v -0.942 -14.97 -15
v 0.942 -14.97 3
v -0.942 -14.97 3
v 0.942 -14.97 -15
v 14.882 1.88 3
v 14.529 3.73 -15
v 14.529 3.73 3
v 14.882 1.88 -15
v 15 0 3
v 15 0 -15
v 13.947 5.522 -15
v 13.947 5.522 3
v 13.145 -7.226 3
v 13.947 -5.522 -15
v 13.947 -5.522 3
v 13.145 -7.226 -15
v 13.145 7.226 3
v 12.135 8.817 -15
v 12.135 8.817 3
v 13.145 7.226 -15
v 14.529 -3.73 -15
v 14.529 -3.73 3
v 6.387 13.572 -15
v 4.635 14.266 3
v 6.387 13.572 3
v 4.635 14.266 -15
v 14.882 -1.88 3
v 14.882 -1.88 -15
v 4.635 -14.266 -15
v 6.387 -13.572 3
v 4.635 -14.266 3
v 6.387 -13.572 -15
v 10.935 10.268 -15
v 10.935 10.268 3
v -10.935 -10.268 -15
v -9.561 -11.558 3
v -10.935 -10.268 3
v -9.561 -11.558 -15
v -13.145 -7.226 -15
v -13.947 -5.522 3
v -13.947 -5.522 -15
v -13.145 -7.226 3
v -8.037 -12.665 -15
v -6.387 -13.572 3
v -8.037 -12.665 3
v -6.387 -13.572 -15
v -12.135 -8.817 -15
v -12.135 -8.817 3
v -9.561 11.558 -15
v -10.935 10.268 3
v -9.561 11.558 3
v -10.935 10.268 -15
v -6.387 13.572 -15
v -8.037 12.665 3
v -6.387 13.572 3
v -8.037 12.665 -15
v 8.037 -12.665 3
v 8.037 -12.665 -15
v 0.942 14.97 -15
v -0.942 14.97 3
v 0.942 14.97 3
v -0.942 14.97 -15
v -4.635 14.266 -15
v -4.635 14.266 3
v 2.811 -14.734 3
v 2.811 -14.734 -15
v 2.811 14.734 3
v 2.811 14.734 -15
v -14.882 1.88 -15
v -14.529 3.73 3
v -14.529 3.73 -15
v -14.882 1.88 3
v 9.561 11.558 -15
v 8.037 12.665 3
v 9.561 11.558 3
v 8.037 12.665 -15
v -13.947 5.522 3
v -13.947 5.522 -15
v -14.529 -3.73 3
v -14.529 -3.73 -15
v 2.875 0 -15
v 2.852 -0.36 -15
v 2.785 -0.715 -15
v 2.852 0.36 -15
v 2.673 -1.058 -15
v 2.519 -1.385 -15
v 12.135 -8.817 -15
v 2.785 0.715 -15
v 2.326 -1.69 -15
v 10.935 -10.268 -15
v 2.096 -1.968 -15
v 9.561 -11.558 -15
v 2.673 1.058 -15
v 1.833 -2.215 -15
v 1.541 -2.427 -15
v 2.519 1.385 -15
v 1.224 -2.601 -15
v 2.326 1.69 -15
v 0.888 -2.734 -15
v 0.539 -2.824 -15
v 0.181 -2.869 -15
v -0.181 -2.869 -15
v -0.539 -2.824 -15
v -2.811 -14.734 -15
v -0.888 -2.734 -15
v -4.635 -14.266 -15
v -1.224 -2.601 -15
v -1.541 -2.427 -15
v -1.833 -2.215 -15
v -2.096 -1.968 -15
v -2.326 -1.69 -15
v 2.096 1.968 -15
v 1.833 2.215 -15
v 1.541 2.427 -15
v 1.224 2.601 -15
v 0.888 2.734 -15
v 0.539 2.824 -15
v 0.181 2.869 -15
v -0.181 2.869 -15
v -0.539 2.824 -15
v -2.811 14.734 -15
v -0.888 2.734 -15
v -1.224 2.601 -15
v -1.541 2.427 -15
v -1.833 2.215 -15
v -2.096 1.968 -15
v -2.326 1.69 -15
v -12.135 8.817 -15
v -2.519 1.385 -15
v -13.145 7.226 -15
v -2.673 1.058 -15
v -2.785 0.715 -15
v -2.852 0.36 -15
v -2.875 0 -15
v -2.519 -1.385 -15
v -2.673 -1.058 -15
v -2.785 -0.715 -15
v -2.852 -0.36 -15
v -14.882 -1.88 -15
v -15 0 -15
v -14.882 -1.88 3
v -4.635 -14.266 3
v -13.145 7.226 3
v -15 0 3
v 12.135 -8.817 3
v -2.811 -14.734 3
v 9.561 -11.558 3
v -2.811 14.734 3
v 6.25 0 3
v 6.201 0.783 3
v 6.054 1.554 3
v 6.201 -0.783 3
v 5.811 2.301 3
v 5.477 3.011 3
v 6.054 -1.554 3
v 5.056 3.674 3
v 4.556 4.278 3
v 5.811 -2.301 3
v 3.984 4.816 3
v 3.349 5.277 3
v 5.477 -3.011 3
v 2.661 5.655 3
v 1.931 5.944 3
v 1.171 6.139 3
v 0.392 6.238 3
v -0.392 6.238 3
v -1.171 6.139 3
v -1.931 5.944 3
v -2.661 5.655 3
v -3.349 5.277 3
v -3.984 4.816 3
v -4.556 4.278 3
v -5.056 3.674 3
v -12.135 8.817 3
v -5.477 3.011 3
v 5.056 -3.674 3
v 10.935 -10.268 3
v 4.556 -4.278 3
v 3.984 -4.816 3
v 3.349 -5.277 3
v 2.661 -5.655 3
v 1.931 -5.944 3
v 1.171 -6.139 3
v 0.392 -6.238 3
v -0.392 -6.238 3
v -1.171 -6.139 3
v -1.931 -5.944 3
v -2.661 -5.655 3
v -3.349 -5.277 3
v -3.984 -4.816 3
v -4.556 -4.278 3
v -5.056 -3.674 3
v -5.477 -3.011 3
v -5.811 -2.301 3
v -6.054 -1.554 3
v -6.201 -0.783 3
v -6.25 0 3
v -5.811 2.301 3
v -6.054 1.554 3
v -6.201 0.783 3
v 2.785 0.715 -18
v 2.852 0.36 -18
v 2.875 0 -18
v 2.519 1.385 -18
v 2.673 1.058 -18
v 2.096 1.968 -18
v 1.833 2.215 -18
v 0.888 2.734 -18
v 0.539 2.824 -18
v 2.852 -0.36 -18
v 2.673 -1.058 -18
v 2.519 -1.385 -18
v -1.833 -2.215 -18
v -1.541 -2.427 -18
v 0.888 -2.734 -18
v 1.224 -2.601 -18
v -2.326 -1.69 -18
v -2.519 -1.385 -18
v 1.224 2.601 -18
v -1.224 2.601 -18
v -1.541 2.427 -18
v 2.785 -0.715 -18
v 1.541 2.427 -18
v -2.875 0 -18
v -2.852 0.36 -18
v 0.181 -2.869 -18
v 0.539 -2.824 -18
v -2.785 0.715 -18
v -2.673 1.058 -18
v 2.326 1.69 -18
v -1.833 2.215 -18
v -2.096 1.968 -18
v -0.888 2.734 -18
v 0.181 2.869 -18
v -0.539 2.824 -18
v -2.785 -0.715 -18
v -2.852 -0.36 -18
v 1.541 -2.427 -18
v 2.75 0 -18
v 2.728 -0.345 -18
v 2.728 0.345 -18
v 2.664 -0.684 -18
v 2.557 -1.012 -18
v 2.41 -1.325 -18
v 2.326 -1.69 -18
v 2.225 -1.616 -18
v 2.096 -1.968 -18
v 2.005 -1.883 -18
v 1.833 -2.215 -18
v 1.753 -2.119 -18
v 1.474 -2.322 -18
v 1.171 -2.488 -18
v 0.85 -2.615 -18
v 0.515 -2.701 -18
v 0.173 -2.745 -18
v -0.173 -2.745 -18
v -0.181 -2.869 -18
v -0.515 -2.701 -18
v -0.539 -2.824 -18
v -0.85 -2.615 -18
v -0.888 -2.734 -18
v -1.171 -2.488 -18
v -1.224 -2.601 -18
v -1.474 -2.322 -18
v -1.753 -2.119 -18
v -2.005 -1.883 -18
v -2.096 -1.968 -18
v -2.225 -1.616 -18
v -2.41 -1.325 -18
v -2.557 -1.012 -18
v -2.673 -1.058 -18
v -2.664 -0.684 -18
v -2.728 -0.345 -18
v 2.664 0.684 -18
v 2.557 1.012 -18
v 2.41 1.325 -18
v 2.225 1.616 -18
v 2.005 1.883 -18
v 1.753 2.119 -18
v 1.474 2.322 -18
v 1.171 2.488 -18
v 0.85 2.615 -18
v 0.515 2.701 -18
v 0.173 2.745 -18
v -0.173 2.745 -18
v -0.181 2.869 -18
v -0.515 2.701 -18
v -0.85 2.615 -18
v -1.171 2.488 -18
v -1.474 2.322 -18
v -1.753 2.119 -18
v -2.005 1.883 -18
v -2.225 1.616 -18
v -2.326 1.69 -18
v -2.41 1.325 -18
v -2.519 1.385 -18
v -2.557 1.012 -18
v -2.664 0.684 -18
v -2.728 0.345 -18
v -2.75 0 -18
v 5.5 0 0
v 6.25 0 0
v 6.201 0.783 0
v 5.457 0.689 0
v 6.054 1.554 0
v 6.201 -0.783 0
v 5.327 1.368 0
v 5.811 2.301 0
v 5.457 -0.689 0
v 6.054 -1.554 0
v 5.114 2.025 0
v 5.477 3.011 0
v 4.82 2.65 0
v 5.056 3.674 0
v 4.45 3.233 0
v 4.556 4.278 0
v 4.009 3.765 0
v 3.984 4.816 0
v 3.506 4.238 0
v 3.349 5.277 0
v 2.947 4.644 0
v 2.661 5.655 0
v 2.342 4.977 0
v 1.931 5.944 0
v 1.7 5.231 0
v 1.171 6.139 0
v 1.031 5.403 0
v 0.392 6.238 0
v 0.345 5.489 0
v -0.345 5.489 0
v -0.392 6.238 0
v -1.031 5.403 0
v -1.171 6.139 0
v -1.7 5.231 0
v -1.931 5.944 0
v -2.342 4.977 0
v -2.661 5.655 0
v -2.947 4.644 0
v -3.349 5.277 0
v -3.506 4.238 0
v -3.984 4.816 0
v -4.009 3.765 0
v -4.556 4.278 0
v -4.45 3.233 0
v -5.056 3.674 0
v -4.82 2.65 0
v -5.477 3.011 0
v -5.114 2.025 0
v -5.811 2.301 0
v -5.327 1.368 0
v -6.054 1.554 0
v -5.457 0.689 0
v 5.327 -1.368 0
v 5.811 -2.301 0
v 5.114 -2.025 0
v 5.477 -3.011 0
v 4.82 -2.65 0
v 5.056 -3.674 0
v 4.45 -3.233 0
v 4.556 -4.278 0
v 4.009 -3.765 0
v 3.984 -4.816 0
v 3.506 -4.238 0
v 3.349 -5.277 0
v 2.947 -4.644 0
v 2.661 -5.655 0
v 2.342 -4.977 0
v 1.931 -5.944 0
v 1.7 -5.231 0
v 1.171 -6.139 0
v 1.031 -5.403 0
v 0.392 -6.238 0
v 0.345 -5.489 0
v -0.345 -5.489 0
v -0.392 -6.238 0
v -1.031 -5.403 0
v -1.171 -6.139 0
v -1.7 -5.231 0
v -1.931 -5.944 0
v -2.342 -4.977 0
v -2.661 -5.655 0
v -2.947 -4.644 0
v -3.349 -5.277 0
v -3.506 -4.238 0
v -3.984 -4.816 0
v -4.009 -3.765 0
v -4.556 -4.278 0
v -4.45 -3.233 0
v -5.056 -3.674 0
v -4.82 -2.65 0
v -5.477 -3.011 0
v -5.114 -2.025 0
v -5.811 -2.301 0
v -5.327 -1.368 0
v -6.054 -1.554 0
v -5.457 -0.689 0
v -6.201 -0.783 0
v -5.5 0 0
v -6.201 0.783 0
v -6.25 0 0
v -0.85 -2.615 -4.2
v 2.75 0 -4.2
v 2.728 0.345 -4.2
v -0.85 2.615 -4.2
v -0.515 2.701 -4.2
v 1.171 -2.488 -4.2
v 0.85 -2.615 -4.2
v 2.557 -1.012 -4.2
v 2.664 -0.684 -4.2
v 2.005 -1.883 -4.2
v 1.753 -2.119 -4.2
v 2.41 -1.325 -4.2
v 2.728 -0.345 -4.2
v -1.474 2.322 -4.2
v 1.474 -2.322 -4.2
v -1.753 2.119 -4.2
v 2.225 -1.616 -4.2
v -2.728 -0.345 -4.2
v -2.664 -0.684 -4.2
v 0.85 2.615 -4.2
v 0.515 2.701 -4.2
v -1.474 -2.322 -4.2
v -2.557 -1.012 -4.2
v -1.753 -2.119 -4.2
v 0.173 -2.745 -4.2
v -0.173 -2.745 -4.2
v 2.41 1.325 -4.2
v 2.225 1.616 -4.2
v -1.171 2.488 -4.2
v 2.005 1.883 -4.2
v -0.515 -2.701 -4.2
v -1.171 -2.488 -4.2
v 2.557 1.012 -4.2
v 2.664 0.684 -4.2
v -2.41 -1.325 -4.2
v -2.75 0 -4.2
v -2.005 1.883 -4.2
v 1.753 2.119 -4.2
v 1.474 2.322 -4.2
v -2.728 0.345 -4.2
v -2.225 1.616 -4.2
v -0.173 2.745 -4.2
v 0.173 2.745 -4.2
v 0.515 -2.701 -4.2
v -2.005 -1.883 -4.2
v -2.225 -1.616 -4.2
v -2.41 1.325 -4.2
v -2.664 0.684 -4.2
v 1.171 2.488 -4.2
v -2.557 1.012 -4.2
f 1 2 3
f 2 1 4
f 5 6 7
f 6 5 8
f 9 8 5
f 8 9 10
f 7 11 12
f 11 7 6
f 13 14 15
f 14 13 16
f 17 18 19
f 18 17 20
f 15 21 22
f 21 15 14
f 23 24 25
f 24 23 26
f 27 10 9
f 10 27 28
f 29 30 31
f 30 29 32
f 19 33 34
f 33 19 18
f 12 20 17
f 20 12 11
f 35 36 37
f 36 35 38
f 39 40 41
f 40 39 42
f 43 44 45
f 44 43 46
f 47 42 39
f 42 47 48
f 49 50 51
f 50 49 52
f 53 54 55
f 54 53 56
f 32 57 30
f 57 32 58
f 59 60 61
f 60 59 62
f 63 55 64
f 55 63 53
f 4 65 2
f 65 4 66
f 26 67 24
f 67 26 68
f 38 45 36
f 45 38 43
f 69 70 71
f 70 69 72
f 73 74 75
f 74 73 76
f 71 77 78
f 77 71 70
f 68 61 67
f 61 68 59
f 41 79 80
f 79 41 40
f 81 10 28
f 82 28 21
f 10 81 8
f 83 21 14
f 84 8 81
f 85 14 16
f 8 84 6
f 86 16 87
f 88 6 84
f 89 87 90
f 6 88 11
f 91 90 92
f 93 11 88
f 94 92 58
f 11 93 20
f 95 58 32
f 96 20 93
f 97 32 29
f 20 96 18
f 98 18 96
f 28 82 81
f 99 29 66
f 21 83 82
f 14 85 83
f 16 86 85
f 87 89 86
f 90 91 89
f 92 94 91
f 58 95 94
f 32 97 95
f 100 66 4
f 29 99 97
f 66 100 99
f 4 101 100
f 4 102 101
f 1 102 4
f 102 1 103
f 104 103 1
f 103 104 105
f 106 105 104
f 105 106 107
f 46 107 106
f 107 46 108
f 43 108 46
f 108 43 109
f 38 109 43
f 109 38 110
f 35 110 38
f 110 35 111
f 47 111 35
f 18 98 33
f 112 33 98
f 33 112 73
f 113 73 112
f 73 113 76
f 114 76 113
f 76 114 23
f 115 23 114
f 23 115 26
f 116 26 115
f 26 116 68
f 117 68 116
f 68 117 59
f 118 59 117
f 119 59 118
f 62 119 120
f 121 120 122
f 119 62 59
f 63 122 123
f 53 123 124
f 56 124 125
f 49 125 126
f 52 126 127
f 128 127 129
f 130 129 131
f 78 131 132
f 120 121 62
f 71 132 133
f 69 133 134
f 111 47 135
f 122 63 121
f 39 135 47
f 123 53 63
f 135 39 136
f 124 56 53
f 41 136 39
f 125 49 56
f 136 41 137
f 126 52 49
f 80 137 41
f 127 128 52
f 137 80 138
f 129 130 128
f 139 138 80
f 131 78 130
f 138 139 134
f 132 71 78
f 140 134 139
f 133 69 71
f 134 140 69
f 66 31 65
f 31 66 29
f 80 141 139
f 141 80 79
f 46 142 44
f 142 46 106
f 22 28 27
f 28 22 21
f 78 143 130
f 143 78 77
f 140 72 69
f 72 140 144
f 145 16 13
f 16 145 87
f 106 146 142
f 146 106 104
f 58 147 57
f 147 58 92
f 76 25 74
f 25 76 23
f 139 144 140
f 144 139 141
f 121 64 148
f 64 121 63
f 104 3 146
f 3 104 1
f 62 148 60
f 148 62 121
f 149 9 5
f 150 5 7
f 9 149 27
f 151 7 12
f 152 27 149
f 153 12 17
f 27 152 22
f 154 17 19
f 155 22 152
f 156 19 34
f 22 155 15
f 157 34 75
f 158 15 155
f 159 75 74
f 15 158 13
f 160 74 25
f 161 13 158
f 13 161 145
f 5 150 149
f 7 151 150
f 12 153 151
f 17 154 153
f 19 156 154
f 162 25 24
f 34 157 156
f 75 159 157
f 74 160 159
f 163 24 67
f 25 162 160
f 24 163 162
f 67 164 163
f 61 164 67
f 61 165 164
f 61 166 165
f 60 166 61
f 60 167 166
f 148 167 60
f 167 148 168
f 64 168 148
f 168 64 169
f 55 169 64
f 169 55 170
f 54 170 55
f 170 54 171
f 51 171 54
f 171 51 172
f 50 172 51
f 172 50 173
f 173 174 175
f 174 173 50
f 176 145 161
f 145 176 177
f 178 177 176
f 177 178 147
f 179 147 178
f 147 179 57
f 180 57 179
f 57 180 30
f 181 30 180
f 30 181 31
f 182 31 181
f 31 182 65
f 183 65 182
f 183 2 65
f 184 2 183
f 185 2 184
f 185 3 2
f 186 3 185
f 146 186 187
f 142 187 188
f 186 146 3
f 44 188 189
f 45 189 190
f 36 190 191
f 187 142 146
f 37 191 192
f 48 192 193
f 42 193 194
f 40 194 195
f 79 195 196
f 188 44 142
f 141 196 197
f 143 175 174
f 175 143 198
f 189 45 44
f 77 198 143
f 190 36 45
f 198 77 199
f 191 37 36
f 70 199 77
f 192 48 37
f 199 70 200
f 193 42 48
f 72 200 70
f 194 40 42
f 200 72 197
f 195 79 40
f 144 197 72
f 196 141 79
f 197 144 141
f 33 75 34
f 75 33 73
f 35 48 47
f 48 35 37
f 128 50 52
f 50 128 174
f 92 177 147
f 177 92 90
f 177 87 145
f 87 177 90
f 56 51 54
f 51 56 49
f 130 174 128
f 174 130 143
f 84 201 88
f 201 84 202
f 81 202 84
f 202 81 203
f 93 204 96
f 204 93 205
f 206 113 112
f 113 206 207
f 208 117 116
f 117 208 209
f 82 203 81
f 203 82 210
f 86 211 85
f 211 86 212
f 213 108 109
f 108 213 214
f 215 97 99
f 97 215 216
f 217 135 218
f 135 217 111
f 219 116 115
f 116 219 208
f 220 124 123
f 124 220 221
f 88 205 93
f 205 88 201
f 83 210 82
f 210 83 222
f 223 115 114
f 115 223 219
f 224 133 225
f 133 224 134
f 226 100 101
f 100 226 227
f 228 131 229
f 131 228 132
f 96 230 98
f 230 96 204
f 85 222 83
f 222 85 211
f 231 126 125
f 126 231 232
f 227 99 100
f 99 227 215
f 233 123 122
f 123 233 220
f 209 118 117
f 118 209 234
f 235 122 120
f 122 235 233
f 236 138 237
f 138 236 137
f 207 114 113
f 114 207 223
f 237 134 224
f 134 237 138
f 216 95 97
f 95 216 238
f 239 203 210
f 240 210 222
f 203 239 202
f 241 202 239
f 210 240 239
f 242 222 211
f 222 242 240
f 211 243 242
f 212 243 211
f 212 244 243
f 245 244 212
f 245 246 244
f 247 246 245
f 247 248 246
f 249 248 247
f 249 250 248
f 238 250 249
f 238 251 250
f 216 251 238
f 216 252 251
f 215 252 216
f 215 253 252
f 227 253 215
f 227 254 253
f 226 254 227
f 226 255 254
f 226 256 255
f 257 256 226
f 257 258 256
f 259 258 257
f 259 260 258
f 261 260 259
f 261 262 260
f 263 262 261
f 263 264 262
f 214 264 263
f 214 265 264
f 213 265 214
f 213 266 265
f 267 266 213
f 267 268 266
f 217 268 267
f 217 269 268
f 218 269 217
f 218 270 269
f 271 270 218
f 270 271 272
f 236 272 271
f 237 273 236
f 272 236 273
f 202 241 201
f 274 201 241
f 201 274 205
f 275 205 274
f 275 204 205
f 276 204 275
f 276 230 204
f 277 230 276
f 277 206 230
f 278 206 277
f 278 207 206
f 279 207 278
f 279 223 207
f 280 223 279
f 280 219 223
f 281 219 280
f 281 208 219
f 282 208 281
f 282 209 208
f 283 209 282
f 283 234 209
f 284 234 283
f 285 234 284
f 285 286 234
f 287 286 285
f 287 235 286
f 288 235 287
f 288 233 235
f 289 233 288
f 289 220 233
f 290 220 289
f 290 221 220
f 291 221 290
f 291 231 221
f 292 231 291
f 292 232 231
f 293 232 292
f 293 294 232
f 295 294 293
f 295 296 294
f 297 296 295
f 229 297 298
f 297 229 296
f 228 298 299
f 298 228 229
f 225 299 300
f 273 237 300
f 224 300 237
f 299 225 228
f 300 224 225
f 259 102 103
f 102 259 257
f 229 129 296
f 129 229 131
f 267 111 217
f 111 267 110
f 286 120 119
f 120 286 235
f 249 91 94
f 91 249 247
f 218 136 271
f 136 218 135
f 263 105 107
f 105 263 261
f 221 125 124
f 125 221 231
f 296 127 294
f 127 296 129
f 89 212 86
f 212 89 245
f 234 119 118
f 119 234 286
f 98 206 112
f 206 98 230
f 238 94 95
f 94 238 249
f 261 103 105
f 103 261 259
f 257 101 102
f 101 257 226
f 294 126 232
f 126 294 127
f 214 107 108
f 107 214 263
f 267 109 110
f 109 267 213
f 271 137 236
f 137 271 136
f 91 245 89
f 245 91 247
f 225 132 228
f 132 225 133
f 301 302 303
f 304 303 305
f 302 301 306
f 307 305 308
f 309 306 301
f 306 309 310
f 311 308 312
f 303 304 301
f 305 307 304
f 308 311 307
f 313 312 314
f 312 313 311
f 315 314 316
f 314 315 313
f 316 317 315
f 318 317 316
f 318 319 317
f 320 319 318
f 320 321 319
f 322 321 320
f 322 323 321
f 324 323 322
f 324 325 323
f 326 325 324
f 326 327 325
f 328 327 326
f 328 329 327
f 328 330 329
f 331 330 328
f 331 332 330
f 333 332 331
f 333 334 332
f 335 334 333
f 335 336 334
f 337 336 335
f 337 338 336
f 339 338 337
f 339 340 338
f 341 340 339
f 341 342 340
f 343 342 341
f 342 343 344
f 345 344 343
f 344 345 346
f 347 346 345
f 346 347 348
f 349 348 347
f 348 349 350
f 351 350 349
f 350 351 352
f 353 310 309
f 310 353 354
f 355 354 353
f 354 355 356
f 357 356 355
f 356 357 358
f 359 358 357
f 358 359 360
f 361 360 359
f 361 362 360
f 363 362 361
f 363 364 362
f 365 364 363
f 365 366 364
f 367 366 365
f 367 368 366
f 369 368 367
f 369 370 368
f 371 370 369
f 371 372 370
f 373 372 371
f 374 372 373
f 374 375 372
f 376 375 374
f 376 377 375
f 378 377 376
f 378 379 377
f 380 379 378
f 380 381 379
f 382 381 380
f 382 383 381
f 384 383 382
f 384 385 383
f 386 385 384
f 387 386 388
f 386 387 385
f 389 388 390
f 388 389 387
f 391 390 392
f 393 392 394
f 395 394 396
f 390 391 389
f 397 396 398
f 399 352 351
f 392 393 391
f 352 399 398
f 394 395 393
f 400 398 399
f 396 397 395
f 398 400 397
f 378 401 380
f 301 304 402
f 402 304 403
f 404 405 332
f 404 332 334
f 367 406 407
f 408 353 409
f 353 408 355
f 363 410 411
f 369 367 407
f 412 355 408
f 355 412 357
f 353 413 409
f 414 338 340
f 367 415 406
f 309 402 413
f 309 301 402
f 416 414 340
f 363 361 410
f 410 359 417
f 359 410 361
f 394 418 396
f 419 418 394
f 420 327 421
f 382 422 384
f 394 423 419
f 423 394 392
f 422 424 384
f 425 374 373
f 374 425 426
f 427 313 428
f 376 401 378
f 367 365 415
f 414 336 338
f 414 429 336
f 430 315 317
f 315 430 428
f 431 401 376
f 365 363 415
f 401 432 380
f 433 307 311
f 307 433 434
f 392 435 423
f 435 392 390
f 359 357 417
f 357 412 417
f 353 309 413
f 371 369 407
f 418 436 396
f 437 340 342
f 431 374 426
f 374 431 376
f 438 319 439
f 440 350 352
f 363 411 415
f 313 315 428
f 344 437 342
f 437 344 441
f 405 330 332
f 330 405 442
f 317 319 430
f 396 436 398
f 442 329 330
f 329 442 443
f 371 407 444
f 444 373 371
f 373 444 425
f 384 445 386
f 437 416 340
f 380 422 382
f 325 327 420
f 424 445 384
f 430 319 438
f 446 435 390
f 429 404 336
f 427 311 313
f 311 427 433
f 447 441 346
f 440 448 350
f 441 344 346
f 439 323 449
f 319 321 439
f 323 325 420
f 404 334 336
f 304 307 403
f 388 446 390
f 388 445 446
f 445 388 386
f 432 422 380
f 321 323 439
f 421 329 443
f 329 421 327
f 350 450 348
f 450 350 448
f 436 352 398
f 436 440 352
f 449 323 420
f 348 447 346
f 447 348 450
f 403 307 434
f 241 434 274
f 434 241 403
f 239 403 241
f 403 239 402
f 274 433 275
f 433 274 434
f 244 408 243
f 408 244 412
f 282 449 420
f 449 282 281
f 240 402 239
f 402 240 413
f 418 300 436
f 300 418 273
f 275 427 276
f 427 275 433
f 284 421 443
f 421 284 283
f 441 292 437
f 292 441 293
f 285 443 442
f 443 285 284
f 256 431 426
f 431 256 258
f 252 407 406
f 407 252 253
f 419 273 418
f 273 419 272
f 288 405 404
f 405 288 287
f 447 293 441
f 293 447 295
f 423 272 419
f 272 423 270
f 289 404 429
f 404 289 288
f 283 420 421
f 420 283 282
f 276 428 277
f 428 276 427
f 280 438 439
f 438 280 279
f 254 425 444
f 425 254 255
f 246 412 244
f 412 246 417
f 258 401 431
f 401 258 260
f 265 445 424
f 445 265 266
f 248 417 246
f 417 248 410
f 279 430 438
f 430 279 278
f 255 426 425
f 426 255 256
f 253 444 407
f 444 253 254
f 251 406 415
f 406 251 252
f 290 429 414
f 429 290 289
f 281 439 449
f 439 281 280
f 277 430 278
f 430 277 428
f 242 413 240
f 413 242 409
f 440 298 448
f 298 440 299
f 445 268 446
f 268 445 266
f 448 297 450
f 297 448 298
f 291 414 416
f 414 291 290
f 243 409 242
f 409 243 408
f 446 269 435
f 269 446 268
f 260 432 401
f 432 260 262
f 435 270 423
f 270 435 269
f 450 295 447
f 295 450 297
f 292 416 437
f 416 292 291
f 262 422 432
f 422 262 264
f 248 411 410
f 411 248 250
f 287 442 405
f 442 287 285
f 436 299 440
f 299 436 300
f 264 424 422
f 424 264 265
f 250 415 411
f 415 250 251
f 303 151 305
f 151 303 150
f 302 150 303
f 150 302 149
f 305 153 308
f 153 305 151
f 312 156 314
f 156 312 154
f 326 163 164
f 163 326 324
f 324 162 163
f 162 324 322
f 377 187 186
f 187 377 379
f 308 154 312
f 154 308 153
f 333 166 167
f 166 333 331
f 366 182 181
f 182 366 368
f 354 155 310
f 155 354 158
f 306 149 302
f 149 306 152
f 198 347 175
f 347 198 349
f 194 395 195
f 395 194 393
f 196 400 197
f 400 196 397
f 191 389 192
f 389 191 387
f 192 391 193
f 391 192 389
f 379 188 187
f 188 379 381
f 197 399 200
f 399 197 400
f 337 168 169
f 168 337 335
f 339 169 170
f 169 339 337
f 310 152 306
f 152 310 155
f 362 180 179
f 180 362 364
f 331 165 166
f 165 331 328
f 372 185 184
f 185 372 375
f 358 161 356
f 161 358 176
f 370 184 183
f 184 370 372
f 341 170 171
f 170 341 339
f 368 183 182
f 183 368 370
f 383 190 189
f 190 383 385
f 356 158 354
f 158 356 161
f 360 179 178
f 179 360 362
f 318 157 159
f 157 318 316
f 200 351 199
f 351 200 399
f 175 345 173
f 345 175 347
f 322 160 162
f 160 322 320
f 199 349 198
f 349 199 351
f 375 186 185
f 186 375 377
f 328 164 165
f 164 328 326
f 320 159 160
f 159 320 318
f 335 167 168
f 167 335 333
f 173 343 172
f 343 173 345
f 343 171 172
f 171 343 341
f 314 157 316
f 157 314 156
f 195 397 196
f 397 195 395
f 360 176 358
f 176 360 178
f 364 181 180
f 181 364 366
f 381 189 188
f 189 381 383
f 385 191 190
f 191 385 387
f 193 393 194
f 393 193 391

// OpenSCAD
$fn = 50;

difference() {
	union() {
		translate(v = [0, 0, -15.0]) {
			cylinder(h = 18, r = 15.0);
		}
		#translate(v = [0, 0, -18.0]) {
			cylinder(h = 18, r = 2.875);
		}
	}
	union() {
		translate(v = [0, 0, 0]) {
			rotate(a = [0, 0, 0]) {
				difference() {
					union() {
						translate(v = [0, 0, -18.0]) {
							cylinder(h = 18, r = 2.25);
						}
						translate(v = [0, 0, -4.2]) {
							cylinder(h = 4.2, r1 = 2.75, r2 = 5.5);
						}
						translate(v = [0, 0, -18.0]) {
							cylinder(h = 18, r = 2.75);
						}
						translate(v = [0, 0, -18.0]) {
							cylinder(h = 18, r = 2.25);
						}
					}
					union();
				}
			}
		}
		#cylinder(h = 3, r = 6.25);
	}
}
